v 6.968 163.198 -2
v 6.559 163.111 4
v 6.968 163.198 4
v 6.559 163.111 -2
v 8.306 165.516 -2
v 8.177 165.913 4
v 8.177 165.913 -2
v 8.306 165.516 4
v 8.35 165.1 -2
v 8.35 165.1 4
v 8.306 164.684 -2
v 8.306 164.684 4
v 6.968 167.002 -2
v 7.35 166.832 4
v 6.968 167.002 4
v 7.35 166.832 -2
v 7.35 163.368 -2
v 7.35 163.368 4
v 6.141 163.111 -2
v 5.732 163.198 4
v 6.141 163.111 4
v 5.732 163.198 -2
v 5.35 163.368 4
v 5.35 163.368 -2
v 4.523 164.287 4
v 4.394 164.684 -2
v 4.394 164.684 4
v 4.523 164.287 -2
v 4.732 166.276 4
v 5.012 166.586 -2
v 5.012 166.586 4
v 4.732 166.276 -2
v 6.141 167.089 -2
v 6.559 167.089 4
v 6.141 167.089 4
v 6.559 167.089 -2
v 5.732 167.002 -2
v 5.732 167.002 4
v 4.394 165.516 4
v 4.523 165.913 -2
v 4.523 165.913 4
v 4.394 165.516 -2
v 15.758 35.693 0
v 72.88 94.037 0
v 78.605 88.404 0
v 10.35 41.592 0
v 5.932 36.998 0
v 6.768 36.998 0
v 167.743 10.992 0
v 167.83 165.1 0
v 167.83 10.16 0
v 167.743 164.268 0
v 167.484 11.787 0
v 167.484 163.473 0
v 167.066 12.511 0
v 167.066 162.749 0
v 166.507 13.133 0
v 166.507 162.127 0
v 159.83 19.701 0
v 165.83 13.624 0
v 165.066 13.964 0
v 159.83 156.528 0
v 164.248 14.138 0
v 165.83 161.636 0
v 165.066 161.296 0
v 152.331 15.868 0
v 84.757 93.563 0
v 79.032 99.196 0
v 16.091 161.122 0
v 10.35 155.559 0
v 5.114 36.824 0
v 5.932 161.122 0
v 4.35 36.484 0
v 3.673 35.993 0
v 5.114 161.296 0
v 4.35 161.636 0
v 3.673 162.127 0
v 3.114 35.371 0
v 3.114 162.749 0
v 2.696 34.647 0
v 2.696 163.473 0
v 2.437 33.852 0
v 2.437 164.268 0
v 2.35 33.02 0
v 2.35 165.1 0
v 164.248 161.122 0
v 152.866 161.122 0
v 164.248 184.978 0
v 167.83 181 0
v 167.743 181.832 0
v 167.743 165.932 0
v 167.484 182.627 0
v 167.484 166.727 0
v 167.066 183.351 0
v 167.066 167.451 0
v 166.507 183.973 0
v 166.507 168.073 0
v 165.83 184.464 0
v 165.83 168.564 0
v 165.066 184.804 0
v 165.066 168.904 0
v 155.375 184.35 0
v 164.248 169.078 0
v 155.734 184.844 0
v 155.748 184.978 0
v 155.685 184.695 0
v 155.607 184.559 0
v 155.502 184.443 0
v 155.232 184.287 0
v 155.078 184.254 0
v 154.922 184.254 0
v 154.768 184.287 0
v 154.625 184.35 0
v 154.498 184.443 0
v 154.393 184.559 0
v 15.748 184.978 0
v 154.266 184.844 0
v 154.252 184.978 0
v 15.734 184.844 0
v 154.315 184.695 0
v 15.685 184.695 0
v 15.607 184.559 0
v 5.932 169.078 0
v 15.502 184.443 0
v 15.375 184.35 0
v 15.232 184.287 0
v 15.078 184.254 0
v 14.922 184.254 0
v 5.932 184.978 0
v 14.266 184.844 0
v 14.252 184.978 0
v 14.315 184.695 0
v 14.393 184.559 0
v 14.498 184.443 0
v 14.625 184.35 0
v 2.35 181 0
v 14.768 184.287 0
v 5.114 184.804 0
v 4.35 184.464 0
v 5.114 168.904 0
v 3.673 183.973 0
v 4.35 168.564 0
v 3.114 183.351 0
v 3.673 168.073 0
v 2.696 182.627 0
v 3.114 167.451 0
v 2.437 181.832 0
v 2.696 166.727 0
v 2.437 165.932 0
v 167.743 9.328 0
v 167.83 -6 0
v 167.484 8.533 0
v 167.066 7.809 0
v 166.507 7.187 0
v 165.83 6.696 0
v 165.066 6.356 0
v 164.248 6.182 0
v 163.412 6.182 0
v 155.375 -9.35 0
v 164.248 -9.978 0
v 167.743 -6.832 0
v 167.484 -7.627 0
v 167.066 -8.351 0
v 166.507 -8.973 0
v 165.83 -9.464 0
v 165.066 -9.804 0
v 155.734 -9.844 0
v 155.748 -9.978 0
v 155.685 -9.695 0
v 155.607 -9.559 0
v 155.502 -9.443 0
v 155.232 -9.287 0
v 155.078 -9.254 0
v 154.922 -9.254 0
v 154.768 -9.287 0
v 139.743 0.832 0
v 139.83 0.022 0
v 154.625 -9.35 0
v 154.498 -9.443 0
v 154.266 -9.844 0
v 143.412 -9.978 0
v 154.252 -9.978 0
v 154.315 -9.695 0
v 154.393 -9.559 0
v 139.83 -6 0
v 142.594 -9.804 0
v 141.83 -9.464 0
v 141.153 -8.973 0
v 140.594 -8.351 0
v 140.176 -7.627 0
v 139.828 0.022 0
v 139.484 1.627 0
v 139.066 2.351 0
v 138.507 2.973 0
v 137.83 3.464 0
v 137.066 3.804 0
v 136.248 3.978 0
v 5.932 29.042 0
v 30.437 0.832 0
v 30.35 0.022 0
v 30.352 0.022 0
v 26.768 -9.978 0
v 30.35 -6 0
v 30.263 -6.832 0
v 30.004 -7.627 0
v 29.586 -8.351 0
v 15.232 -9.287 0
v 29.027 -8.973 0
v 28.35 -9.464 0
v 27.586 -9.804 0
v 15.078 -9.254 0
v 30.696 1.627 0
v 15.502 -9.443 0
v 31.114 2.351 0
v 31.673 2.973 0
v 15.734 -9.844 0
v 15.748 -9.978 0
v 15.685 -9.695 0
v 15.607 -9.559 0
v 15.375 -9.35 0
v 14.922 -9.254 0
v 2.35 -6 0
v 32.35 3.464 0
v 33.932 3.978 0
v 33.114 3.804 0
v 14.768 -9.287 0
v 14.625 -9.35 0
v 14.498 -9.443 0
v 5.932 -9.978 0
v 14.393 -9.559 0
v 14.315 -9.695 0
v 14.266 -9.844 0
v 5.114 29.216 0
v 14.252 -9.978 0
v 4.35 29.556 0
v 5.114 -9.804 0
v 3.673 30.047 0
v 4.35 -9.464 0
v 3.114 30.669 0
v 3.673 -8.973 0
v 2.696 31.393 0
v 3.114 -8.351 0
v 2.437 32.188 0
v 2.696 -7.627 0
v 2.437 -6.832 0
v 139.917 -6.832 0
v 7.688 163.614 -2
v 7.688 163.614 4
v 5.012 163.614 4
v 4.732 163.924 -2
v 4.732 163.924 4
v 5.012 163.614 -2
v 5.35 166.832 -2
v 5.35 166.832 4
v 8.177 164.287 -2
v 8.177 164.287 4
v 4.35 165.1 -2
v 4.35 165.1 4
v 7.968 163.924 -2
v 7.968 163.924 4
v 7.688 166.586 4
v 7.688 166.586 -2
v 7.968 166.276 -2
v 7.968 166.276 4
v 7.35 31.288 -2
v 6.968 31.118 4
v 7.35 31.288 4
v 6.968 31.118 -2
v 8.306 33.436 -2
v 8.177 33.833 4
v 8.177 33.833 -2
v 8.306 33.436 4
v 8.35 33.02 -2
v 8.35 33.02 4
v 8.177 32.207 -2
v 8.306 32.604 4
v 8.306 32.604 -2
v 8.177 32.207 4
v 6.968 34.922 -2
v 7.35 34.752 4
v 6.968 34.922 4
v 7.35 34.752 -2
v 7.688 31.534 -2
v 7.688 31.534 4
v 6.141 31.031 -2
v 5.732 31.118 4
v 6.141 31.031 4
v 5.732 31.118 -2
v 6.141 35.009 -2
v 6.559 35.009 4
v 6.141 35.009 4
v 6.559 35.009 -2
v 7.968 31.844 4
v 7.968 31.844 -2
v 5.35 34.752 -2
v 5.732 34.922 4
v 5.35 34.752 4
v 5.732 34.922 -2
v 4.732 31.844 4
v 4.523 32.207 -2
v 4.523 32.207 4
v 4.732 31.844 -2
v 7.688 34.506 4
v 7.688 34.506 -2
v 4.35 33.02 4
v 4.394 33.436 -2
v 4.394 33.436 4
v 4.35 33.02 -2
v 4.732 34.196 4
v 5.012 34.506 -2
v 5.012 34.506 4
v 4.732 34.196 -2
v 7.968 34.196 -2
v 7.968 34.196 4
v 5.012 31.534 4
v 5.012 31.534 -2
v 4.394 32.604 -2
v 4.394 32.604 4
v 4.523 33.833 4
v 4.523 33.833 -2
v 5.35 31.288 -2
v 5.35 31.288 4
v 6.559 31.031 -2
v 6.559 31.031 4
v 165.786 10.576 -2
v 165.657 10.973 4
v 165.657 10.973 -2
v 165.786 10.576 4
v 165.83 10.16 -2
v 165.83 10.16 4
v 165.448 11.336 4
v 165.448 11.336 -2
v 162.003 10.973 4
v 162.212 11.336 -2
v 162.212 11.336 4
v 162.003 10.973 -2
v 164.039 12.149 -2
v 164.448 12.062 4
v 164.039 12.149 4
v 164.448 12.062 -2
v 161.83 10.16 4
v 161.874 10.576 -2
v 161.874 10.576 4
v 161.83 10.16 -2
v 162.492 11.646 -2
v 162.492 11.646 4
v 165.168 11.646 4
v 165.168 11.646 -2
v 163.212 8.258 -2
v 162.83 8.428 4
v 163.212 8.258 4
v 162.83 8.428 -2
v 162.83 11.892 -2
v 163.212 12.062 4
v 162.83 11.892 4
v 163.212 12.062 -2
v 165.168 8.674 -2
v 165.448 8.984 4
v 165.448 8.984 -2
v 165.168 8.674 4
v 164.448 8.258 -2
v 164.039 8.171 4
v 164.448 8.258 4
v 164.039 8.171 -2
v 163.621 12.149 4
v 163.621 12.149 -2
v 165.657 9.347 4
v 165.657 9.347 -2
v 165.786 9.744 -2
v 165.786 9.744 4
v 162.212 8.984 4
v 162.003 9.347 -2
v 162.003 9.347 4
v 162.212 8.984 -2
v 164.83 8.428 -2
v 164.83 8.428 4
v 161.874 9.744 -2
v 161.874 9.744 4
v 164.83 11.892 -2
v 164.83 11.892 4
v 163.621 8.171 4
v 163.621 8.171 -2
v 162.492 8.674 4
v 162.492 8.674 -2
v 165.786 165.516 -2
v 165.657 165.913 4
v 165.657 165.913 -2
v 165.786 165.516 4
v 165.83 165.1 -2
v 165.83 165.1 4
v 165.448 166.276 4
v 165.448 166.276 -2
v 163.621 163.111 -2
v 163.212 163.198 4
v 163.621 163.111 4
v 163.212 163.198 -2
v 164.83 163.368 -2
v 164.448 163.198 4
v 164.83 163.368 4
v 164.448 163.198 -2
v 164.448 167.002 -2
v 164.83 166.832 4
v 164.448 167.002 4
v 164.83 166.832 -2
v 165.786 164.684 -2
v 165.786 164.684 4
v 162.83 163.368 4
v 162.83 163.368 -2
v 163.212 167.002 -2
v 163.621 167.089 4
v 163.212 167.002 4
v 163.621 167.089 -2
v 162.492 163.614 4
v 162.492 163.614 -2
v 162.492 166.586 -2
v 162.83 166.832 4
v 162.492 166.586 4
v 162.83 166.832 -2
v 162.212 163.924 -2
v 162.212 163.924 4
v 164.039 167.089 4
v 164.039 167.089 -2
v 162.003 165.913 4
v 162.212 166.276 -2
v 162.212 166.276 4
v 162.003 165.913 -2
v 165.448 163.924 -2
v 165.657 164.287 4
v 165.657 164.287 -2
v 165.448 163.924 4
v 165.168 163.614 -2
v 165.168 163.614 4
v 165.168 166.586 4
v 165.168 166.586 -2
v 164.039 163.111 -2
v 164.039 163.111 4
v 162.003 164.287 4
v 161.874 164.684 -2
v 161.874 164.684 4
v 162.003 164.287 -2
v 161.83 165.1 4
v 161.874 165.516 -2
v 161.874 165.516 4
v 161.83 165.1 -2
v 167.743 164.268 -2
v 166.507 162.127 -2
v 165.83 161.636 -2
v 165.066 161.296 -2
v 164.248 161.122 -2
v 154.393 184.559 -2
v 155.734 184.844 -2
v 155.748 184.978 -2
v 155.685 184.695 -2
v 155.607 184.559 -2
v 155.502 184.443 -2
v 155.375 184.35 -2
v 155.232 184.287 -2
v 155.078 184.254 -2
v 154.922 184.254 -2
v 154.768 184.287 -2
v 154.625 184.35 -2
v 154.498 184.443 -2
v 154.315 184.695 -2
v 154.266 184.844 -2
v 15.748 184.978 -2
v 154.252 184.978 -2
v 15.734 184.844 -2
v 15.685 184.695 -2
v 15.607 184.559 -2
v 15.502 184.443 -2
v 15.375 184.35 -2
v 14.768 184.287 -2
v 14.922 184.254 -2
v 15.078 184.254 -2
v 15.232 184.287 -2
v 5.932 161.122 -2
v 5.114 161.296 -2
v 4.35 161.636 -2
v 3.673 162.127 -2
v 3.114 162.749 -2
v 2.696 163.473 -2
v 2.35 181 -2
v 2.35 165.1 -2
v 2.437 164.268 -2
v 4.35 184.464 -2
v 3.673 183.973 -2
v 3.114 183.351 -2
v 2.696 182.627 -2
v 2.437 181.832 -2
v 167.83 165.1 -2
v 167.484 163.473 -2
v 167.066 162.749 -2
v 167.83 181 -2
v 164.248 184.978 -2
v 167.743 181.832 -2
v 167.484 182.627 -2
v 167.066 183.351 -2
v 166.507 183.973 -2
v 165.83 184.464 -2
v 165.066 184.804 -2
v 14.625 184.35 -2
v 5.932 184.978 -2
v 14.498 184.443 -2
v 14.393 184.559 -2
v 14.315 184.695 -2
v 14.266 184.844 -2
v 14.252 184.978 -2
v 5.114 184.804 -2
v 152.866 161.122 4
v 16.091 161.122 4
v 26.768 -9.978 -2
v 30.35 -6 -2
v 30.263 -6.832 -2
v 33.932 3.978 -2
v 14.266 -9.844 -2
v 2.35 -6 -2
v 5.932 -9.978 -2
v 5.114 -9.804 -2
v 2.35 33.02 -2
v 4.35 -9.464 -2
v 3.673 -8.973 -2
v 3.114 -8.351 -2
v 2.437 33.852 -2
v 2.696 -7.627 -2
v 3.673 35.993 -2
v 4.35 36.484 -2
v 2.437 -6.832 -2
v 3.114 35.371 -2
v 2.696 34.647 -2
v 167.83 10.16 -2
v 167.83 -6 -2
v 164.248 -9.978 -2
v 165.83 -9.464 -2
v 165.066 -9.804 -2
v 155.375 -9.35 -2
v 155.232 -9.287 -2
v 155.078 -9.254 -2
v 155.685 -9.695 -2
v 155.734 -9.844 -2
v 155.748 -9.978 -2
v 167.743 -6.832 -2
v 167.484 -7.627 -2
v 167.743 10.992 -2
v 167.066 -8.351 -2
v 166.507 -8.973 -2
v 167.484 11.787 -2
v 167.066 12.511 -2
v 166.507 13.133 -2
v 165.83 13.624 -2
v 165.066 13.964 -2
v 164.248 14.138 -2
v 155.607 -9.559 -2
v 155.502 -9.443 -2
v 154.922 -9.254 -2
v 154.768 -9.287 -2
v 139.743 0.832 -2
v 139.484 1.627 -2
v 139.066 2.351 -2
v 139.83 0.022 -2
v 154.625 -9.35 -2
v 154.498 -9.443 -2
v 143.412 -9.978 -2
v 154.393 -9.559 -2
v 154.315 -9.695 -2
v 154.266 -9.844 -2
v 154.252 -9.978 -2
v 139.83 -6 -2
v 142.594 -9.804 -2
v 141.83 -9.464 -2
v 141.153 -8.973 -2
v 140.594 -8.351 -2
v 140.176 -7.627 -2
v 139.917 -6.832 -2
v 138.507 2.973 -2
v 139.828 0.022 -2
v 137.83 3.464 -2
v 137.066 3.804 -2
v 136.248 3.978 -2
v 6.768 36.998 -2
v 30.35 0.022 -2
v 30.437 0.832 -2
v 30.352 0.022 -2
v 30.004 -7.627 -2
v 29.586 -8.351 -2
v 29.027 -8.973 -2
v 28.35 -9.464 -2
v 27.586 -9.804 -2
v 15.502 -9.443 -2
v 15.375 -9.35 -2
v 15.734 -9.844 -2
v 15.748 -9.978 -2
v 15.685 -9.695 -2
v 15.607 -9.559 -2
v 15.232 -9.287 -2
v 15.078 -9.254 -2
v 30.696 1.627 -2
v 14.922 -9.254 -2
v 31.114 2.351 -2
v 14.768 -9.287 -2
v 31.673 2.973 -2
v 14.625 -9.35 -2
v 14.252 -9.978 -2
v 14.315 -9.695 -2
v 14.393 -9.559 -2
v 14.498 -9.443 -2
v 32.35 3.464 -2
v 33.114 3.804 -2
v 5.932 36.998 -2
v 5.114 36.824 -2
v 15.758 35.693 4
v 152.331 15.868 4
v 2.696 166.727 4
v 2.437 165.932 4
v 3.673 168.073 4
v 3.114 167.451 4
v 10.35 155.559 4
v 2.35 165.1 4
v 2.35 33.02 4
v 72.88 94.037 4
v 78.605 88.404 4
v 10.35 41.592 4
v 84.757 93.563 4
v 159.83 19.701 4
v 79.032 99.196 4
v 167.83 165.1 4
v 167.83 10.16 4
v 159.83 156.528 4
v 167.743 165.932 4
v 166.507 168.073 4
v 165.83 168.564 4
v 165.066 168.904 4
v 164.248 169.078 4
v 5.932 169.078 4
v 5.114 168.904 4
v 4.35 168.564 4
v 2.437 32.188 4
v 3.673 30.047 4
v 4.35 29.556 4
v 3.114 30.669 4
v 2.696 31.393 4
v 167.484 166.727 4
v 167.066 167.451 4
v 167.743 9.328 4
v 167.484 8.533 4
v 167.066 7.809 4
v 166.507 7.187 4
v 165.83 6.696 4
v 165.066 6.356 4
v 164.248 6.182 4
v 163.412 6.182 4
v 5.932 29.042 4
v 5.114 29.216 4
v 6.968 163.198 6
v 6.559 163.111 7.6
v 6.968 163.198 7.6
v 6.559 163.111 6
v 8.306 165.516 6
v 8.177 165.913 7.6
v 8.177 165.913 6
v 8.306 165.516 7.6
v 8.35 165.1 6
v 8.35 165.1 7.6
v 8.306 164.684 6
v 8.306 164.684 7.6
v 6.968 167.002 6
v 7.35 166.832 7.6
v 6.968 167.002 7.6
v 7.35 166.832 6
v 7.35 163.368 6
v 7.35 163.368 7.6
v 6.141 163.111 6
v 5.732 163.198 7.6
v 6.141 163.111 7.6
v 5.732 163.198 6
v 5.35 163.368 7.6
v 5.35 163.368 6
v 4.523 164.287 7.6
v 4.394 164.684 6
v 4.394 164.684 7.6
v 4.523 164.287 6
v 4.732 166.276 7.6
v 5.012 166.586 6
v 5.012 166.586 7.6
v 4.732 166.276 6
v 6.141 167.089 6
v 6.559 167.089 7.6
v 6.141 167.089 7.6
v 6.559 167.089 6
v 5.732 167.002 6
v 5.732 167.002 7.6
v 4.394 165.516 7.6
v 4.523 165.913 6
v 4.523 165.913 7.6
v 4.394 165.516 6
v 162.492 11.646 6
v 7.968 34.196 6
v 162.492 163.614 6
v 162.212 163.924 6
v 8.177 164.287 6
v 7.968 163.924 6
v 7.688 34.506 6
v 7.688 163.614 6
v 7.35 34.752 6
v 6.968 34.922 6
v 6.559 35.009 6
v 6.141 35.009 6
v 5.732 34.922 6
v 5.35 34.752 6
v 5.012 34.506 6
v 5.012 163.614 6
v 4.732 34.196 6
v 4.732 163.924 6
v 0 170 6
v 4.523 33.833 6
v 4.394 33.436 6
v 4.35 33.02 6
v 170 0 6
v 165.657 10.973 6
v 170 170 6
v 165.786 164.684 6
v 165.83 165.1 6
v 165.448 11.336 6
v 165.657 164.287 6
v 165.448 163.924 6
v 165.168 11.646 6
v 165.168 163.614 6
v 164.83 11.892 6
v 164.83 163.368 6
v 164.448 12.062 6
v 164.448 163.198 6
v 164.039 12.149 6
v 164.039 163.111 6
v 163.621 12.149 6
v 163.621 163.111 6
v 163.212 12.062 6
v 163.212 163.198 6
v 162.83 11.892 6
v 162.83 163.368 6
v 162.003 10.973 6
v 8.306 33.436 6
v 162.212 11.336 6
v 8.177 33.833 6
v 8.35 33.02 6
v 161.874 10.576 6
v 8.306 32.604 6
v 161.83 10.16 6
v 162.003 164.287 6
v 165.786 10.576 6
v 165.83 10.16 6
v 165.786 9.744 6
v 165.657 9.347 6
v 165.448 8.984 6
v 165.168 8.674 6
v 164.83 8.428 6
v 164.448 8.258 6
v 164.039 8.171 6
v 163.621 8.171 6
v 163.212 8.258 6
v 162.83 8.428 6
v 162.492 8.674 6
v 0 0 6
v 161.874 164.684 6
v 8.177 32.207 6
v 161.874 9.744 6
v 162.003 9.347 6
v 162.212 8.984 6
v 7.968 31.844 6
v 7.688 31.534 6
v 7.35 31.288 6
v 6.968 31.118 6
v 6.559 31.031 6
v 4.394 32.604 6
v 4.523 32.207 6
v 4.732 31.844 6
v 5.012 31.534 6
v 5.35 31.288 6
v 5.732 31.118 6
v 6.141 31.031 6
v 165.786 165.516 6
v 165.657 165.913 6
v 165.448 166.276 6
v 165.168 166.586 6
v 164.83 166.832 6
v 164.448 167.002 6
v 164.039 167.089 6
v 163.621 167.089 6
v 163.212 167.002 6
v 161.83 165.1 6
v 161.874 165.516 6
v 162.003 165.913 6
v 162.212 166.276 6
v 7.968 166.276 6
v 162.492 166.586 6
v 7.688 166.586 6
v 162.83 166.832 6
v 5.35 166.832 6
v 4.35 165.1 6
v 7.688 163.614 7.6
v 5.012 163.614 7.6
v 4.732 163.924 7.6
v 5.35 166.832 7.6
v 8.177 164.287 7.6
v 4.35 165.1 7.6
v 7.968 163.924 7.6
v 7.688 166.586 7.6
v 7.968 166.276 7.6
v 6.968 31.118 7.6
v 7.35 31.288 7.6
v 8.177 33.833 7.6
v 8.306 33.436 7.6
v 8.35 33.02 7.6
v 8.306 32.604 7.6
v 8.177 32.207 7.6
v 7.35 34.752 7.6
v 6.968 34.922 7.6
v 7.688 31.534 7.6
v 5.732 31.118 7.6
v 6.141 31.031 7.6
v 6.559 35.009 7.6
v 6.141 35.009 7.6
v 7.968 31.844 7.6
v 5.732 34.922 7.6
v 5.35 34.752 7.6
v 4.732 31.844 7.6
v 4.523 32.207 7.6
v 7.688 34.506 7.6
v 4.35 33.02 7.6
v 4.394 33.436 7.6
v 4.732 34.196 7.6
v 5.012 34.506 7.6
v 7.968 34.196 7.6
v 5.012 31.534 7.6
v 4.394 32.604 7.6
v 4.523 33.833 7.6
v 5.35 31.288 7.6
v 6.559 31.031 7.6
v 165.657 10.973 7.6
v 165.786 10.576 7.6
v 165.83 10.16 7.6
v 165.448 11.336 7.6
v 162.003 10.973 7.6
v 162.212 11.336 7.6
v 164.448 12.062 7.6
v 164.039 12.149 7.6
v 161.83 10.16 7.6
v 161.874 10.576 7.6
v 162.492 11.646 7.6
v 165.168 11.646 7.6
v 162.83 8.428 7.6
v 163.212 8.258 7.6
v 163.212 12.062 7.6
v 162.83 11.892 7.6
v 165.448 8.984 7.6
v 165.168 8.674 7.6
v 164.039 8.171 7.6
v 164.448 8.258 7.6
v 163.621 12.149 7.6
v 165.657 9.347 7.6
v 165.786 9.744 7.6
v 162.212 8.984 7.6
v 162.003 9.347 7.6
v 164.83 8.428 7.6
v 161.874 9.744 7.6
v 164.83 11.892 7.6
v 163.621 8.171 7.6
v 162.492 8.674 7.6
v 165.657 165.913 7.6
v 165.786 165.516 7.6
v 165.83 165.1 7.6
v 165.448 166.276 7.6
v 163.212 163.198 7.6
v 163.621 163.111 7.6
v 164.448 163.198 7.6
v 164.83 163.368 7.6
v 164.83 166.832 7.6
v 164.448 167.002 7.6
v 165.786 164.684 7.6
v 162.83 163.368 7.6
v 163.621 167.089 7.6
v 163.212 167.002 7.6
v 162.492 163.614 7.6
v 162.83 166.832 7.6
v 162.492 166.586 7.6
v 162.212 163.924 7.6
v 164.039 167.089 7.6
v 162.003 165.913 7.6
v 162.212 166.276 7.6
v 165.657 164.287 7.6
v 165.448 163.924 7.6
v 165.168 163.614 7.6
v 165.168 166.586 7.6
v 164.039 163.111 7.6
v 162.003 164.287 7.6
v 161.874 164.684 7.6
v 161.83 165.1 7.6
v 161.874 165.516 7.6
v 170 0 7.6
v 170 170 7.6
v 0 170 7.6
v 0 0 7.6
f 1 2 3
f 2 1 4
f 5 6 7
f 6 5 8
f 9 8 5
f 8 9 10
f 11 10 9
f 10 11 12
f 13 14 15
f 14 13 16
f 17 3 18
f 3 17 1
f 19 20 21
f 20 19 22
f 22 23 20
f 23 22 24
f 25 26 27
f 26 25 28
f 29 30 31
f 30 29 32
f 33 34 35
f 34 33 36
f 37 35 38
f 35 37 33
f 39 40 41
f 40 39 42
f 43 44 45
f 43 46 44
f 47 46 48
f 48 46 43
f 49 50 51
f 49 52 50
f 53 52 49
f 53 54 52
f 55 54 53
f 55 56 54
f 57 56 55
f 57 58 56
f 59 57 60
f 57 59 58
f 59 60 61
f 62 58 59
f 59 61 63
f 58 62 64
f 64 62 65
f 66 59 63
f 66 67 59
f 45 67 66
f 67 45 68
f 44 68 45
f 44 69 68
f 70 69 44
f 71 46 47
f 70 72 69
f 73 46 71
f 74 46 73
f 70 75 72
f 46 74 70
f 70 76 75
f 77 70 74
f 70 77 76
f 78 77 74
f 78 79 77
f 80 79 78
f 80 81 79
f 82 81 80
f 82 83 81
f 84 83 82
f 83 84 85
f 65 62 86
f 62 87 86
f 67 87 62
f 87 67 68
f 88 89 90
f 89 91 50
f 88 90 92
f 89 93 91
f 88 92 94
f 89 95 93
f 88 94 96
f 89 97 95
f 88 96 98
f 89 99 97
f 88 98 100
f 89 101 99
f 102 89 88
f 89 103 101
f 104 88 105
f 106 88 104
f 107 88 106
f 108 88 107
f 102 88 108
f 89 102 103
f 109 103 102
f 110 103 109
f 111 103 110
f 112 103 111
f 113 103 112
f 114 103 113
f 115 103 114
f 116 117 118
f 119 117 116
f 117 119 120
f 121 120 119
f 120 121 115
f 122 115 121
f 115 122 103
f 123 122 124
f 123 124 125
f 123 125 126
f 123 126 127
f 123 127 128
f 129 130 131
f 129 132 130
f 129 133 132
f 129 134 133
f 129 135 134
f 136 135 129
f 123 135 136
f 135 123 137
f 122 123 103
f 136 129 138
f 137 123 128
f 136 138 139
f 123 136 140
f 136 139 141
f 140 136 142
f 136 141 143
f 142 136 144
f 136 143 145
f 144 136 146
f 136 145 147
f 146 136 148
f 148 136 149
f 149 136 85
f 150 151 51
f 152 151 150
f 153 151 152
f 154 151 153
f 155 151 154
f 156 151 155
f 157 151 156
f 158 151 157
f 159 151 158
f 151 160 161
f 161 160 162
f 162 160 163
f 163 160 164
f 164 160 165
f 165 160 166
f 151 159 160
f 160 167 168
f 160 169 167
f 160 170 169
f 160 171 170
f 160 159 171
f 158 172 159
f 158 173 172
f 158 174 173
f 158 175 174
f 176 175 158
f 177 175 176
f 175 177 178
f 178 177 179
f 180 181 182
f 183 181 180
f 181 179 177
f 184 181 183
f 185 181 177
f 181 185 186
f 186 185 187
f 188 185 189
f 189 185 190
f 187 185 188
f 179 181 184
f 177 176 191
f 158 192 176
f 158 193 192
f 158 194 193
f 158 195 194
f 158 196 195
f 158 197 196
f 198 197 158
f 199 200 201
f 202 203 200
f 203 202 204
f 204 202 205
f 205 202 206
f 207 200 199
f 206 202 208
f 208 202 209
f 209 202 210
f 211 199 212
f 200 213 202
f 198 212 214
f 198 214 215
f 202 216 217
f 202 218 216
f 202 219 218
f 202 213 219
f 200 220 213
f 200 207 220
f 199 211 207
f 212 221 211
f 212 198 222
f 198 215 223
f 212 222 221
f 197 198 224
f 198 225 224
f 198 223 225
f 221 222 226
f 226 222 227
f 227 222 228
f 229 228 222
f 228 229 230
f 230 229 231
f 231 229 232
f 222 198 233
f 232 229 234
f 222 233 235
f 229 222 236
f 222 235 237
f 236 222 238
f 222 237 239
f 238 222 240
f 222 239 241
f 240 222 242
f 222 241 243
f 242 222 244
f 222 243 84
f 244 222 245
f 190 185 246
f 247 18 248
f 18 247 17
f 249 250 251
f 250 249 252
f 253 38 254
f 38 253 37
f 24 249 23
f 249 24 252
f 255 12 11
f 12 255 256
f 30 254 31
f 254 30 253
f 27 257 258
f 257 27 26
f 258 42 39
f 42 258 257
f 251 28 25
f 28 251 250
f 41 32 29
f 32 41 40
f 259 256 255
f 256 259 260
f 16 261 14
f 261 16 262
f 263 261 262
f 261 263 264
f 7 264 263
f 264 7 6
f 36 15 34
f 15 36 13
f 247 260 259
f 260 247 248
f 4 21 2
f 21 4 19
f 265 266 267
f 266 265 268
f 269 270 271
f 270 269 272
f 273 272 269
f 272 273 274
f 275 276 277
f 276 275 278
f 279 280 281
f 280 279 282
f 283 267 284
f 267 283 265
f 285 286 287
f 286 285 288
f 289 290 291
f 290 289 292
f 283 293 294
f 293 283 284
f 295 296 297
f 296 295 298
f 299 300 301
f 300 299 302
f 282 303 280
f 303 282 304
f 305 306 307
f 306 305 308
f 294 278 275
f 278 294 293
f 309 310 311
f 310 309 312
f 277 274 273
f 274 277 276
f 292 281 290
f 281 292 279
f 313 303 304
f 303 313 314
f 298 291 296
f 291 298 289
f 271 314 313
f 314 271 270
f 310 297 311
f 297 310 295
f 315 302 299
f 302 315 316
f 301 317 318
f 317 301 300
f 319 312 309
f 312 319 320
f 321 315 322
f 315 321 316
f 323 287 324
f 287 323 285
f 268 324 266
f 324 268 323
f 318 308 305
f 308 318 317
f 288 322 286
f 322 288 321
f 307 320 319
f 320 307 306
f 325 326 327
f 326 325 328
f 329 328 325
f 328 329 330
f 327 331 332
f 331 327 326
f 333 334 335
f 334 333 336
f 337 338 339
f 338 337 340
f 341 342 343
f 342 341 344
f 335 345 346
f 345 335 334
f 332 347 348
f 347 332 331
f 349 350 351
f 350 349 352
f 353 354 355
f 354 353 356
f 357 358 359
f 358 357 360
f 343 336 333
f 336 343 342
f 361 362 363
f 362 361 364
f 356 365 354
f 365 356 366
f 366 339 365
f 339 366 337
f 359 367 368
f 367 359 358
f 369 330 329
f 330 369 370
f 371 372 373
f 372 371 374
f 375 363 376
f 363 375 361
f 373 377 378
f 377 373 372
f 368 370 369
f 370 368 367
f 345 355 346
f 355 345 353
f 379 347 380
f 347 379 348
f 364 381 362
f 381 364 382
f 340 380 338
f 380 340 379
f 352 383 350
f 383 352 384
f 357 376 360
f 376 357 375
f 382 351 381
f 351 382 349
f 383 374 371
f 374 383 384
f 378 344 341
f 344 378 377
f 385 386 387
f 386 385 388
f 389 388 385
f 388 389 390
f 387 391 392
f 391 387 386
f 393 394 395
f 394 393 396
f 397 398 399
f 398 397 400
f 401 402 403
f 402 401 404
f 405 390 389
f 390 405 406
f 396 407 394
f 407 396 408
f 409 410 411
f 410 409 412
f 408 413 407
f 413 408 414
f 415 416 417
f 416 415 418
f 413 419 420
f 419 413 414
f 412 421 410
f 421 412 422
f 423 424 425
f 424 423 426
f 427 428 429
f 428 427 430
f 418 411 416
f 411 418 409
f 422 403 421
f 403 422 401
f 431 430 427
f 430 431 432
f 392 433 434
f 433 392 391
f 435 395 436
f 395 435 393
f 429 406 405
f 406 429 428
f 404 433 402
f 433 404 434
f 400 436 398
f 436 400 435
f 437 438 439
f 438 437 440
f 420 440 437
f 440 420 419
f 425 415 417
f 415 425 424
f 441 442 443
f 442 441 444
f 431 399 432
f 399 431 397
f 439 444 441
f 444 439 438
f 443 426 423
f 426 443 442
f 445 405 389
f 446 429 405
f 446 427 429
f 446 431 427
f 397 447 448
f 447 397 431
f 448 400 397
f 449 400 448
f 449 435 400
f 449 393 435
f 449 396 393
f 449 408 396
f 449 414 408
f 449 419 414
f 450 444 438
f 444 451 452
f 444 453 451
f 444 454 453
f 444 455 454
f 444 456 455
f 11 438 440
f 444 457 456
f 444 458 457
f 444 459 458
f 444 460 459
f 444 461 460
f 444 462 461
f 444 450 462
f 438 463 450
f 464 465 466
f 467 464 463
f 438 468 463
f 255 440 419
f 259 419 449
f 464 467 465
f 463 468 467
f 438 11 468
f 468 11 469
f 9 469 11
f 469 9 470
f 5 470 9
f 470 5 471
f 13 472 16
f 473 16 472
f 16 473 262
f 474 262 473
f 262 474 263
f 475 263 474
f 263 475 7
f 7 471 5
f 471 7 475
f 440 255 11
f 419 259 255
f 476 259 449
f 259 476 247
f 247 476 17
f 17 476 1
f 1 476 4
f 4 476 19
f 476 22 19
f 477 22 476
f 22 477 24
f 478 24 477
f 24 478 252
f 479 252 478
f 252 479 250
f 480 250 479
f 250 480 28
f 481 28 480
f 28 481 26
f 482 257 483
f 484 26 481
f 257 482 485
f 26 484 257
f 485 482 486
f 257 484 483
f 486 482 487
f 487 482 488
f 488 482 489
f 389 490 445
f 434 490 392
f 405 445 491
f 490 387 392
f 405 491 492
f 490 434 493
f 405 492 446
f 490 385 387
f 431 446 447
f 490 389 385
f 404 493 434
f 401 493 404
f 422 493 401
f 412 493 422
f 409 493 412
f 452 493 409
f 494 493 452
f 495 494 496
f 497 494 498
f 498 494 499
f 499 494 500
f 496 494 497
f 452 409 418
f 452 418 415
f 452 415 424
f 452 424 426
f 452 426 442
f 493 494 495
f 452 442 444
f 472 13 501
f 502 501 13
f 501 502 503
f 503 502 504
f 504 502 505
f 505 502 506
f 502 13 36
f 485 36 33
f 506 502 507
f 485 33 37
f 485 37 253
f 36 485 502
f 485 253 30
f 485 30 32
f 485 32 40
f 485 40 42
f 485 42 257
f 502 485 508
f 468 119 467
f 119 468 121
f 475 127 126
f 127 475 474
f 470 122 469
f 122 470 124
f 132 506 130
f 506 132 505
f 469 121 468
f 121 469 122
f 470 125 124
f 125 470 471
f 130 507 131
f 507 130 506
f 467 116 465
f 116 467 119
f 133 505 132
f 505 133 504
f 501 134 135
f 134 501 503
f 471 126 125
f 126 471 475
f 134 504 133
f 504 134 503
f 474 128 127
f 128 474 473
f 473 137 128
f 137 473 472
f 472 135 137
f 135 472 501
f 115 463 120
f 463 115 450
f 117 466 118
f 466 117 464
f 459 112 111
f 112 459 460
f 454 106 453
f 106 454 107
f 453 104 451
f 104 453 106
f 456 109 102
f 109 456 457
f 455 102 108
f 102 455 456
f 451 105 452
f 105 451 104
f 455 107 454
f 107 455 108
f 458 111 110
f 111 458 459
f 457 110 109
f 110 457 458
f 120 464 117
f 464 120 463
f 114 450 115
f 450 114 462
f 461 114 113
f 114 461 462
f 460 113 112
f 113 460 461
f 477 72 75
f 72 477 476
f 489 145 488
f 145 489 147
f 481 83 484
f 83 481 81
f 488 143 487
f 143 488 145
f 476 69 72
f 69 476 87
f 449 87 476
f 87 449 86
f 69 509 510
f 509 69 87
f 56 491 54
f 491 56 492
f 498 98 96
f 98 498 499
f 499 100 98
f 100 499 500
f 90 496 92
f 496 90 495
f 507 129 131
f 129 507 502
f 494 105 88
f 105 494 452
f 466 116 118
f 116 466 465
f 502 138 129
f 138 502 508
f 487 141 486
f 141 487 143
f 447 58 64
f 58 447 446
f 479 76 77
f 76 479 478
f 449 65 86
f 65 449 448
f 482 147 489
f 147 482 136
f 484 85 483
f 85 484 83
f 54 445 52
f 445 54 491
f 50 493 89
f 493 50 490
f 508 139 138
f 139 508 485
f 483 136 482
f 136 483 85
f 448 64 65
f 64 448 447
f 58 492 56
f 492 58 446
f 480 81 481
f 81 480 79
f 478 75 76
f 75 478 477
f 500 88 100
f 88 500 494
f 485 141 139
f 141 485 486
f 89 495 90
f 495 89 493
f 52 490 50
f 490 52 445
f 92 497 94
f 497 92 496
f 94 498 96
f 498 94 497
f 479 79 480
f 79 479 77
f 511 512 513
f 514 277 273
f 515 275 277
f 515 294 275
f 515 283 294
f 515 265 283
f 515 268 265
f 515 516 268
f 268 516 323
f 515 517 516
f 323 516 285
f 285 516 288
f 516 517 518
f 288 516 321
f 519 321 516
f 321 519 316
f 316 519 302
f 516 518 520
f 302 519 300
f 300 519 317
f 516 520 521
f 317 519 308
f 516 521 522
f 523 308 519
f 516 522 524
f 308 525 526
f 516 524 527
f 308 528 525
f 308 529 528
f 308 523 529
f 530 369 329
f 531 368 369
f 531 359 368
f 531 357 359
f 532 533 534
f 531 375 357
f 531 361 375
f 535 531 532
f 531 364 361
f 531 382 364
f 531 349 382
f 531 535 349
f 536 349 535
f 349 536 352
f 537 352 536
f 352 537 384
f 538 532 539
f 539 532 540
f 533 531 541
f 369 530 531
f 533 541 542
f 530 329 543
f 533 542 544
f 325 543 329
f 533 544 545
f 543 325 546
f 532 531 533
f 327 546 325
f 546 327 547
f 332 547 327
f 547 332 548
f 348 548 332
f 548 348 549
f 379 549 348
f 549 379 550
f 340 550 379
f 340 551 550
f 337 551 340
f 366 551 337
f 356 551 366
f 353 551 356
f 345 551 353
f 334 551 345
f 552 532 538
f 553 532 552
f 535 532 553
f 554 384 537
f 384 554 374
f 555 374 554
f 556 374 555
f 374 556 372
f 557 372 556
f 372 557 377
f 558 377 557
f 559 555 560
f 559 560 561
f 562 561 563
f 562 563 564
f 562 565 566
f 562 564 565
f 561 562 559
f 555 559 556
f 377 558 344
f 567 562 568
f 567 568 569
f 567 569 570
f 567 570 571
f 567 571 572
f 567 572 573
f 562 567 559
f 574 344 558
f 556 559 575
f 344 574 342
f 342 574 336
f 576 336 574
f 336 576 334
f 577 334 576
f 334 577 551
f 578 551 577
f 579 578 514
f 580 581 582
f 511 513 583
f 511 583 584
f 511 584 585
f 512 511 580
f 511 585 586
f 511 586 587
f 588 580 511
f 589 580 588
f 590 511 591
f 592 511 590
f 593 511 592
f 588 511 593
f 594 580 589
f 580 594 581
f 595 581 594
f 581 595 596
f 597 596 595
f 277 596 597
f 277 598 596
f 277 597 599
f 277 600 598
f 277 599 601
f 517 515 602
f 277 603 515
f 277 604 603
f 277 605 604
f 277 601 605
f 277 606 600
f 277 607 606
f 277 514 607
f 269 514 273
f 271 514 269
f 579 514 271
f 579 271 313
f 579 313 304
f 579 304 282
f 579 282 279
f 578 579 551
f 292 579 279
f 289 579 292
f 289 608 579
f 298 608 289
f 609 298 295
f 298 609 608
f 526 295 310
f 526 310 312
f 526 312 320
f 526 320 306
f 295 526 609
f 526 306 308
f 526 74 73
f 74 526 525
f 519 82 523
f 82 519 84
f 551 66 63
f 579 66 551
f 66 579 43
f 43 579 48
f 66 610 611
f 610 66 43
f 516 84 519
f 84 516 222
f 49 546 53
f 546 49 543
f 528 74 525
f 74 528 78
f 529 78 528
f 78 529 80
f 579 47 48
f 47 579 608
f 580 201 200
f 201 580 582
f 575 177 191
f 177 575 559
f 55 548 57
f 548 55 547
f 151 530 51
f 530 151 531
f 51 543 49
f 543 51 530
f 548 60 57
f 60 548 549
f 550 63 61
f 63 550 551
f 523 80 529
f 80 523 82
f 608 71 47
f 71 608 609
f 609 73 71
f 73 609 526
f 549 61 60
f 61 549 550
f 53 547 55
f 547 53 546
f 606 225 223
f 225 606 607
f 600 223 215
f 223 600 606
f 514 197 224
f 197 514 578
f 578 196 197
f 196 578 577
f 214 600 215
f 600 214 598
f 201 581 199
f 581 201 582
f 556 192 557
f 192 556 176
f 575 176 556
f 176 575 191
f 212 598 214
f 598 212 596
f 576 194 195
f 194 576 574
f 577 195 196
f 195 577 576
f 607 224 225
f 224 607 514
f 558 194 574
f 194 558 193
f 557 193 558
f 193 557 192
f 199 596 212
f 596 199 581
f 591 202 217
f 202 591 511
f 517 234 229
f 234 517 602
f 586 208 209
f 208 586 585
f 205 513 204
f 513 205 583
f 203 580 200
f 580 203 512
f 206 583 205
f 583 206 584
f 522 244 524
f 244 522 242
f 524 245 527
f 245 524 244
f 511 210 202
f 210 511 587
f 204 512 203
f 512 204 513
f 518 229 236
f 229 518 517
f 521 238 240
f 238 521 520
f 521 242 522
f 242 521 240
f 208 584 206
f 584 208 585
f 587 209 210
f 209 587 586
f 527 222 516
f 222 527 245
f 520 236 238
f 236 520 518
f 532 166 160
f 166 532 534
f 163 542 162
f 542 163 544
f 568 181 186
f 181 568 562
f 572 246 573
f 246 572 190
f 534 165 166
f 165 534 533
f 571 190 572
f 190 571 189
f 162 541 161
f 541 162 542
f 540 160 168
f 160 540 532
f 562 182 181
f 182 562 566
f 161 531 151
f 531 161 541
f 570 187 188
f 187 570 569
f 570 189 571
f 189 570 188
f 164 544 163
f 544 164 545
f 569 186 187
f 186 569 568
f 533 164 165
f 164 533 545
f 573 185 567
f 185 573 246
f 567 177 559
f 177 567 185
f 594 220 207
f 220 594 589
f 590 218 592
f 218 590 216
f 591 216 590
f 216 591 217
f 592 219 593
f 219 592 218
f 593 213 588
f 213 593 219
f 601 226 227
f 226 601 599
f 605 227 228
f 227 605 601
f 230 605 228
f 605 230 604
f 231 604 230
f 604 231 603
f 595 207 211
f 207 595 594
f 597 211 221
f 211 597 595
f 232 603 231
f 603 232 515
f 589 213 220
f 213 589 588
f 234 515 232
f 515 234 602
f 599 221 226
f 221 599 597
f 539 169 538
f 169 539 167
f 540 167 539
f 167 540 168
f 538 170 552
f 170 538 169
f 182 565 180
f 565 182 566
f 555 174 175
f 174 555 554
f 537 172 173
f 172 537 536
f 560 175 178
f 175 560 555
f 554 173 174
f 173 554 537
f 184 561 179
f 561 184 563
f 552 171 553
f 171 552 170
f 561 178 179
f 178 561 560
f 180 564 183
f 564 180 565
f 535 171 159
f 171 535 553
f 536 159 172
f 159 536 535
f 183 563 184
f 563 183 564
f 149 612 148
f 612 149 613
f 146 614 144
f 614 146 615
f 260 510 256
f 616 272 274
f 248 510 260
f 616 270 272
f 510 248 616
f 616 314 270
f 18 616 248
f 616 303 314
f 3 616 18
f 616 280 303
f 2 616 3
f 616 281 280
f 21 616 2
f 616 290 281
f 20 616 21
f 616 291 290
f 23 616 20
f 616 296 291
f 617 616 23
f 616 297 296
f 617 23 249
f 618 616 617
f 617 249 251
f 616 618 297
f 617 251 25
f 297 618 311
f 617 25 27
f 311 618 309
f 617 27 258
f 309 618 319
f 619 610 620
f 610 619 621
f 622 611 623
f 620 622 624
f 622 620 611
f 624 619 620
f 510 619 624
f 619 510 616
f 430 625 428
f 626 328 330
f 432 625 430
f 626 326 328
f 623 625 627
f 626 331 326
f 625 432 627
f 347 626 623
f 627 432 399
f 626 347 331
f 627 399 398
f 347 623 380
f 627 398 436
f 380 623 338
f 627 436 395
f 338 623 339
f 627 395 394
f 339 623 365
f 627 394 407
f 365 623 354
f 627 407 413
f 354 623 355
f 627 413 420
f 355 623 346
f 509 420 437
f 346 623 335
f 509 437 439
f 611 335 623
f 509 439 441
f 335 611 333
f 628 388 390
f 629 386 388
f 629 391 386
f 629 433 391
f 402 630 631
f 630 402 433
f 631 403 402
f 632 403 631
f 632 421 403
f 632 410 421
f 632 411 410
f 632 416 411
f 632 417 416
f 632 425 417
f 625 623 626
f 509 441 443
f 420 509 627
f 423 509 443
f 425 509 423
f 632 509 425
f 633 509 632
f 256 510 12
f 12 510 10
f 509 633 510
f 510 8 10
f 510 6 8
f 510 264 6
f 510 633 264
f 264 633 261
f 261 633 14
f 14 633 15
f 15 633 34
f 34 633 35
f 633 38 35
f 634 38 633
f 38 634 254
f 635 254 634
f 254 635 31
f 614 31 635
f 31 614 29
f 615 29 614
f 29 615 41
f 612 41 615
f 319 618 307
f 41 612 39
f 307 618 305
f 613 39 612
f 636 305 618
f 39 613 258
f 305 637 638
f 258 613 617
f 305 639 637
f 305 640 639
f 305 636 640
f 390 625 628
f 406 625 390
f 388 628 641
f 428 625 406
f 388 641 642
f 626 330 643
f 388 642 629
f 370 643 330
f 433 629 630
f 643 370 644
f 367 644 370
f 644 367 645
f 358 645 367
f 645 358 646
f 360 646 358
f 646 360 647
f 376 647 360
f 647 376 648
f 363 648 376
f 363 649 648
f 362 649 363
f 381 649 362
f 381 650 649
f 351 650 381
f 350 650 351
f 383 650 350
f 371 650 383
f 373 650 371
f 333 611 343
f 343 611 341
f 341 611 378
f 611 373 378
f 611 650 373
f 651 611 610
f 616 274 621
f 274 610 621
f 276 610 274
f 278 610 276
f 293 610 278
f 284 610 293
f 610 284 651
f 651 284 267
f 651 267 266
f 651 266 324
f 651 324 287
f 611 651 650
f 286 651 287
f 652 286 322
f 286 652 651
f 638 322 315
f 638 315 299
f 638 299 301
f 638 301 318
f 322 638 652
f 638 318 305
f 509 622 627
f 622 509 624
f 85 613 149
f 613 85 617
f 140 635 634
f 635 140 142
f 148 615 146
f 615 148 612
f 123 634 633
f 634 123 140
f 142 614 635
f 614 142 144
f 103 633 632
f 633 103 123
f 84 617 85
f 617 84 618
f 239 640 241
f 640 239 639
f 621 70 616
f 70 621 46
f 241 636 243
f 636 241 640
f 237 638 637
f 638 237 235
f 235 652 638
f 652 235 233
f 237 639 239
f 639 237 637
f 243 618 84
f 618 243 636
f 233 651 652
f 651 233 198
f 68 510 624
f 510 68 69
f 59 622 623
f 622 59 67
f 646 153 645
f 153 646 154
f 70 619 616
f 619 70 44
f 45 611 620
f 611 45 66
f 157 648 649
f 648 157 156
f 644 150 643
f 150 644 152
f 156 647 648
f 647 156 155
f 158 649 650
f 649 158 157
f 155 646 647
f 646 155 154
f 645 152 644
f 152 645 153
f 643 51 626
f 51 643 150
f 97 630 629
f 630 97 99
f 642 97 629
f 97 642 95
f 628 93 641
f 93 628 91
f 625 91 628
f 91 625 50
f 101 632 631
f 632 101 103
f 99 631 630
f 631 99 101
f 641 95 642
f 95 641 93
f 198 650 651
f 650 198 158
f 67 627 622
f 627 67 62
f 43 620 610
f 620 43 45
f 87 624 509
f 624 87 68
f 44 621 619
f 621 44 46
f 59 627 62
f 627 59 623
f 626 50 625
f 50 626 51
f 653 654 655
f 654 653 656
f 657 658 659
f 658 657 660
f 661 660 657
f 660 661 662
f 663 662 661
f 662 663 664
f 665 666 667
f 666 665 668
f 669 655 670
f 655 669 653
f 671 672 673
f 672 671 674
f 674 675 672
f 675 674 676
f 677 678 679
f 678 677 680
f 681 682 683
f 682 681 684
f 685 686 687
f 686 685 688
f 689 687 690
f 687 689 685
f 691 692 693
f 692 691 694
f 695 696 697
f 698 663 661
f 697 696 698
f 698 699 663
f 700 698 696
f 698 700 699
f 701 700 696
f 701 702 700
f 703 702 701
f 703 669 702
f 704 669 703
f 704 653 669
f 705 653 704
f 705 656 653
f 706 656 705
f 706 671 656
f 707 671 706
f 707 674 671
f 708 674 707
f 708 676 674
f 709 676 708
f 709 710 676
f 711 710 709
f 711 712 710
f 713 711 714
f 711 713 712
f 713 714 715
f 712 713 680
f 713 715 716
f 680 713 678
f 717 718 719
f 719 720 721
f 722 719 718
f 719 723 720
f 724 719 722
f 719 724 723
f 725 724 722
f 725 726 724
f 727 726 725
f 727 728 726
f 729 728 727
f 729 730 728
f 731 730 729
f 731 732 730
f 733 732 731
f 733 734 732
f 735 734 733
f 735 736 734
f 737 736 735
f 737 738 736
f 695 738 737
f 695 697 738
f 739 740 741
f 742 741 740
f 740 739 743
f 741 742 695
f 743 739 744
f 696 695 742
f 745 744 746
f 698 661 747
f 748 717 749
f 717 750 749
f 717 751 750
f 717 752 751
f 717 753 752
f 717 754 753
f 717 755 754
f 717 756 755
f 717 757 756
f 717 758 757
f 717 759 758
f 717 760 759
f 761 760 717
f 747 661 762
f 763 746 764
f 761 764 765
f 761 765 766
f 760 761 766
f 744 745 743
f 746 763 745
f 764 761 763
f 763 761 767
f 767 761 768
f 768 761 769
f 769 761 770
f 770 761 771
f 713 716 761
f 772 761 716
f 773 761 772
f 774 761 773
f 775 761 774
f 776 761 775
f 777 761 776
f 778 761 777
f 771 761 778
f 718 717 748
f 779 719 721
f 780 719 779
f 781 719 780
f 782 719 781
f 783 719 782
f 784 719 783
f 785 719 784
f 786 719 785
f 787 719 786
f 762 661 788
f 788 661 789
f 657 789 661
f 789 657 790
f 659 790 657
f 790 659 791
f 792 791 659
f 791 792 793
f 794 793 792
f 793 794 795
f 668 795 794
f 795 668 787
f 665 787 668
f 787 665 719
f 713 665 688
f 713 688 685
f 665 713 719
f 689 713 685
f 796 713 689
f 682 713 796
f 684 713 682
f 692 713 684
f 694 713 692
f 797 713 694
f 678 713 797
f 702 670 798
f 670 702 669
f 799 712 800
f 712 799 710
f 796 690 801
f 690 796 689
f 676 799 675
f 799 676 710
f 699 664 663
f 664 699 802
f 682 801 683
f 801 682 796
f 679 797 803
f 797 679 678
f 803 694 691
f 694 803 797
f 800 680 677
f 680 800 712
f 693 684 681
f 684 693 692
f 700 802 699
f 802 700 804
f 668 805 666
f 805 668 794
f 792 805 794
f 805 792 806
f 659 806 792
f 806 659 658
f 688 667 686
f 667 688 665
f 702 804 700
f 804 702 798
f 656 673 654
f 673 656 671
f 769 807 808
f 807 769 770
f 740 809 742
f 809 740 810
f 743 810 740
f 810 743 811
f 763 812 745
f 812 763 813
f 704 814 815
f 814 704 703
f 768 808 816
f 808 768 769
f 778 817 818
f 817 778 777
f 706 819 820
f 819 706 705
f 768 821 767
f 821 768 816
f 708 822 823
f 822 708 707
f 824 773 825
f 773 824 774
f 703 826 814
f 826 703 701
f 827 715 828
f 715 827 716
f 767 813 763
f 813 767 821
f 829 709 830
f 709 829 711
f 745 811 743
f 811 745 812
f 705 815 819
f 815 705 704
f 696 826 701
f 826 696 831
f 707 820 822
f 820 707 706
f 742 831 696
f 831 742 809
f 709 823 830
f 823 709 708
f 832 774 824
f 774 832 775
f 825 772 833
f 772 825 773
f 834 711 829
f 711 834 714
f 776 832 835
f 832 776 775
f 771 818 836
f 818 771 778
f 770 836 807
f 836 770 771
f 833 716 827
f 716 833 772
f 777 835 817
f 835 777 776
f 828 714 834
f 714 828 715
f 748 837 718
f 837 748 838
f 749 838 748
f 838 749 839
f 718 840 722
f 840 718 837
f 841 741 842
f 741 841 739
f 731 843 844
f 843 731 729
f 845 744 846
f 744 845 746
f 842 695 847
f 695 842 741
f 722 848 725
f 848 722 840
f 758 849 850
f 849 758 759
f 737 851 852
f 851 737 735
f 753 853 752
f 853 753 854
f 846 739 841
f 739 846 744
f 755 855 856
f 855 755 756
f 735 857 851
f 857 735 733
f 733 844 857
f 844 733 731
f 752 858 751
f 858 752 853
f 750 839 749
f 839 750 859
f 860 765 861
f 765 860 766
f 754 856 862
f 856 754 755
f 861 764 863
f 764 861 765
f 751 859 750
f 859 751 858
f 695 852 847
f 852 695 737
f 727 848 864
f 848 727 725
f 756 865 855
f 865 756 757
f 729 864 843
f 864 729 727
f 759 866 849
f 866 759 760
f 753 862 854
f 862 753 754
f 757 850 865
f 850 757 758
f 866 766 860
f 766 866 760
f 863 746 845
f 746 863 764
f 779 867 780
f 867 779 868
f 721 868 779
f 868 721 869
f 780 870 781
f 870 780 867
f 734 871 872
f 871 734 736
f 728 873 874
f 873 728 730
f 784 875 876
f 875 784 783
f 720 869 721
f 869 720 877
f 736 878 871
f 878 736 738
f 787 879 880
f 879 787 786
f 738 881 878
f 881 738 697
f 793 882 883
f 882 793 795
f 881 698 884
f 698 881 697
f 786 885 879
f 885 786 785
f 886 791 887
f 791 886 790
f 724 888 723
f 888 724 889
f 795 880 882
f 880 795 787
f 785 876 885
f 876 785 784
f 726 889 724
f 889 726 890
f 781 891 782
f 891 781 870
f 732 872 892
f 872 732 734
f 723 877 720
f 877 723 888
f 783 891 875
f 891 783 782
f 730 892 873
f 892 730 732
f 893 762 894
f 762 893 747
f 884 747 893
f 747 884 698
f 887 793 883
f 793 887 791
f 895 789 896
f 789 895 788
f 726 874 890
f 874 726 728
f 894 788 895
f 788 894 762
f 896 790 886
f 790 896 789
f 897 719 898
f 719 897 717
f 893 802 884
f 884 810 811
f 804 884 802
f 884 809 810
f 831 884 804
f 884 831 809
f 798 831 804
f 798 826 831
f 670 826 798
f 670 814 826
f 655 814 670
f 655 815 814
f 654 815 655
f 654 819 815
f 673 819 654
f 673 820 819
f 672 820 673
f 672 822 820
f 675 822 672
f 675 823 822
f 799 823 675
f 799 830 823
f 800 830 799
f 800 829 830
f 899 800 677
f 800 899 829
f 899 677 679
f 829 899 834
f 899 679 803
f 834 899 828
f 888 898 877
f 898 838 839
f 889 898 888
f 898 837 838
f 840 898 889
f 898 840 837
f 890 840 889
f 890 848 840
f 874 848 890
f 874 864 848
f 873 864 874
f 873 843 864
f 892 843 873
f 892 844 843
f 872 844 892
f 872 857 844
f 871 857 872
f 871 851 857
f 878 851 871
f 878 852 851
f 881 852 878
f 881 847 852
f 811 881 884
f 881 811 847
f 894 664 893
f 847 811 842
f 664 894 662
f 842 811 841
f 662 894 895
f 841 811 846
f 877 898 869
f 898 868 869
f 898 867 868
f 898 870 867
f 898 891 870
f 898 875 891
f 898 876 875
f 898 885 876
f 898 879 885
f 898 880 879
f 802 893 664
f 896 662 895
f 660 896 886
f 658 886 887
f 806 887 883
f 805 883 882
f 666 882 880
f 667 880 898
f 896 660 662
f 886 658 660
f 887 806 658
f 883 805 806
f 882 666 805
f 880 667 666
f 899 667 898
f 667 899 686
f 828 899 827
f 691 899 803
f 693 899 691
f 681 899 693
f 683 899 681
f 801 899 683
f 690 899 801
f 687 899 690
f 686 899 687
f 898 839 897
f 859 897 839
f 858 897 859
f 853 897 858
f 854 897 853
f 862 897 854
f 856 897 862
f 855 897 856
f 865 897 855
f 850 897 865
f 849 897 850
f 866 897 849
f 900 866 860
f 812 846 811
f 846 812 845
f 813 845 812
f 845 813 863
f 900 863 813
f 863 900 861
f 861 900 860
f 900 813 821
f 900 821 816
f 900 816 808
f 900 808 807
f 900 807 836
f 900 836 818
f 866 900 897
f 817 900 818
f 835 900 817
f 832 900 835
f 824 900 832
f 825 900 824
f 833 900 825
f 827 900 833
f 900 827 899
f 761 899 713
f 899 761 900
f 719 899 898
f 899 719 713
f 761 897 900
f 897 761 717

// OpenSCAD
BOARD_WIDTH = 170;
BOARD_LENGTH = 170;
BOARD_THICKNESS = 1.6;

MOUNT_HOLE_DIA = 4;
MOUNT_HOLE_SPACING = [
  [6.35, 165.1],
  [6.35, 33.02],
  [163.83, 10.16],
  [163.83, 165.1]
];

SUPPORT_THICKNESS = 4;
SUPPORT_CORNER_DIA = 2 * MOUNT_HOLE_DIA;

RAIL_THICKNESS = 2;
RAIL_CORNER_DIA = SUPPORT_CORNER_DIA;
FRONT_RAIL_EXTENSION = 10;
FRONT_RAIL_TAB_WIDTH = 28;
BACK_RAIL_EXTENSION = 15;

INDEX = true;
INDEX_DIA = 1.5;
INDEX_SPACING = 140;

$fn = 30;

module mounting_holes() {
  #for(i = [0:len(MOUNT_HOLE_SPACING)-1]) {
    translate([MOUNT_HOLE_SPACING[i][0], MOUNT_HOLE_SPACING[i][1], 0])
    cylinder(d = MOUNT_HOLE_DIA, h = 10);
  }
}

module board() {
  difference() {
    cube(size = [BOARD_WIDTH, BOARD_LENGTH, BOARD_THICKNESS]);
    mounting_holes();
  }
}

module pairwise_hull() {
  for(i = [0:$children-1]) {
    for(j = [0:$children-1]) {
      hull() {
        children(i);
        children(j);
      }
    }
  }
}

module board_support() {
  difference() {
    pairwise_hull() {
      // Needs lazy union on module().
      /*for(i = [0:len(MOUNT_HOLE_SPACING)-1]) {
        translate([MOUNT_HOLE_SPACING[i][0], MOUNT_HOLE_SPACING[i][1], 0])
        cylinder(d = MOUNT_HOLE_DIA * 2, h = BOARD_THICKNESS);
      }*/

      translate([MOUNT_HOLE_SPACING[0][0], MOUNT_HOLE_SPACING[0][1], 0])
      cylinder(d = SUPPORT_CORNER_DIA, h = SUPPORT_THICKNESS);
      
      translate([MOUNT_HOLE_SPACING[1][0], MOUNT_HOLE_SPACING[1][1], 0])
      cylinder(d = SUPPORT_CORNER_DIA, h = SUPPORT_THICKNESS);
      
      translate([MOUNT_HOLE_SPACING[2][0], MOUNT_HOLE_SPACING[2][1], 0])
      cylinder(d = SUPPORT_CORNER_DIA, h = SUPPORT_THICKNESS);
      
      translate([MOUNT_HOLE_SPACING[3][0], MOUNT_HOLE_SPACING[3][1], 0])
      cylinder(d = SUPPORT_CORNER_DIA, h = SUPPORT_THICKNESS);
    }
    mounting_holes();
  }
}

module index() {
  for(i = [-1, 1]) {
    translate([i * INDEX_SPACING/2, 0, 0])
    cylinder(d = INDEX_DIA, h = 10);
  }
}

module front_rail() {
  difference() {
    union() {
      difference() {
        hull() {
          translate([MOUNT_HOLE_SPACING[1][0], MOUNT_HOLE_SPACING[1][1], 0])
          cylinder(d = RAIL_CORNER_DIA, h = RAIL_THICKNESS);
            
          translate([MOUNT_HOLE_SPACING[2][0], MOUNT_HOLE_SPACING[2][1], 0])
          cylinder(d = RAIL_CORNER_DIA, h = RAIL_THICKNESS);

          translate([MOUNT_HOLE_SPACING[1][0], RAIL_CORNER_DIA/2, 0])
          cylinder(d = RAIL_CORNER_DIA, h = RAIL_THICKNESS);
            
          translate([MOUNT_HOLE_SPACING[2][0], RAIL_CORNER_DIA/2, 0])
          cylinder(d = RAIL_CORNER_DIA, h = RAIL_THICKNESS);
        }
        hull() {
          translate([MOUNT_HOLE_SPACING[1][0] + FRONT_RAIL_TAB_WIDTH, 0, 0])
          cylinder(d = RAIL_CORNER_DIA, h = RAIL_THICKNESS);

          translate([MOUNT_HOLE_SPACING[2][0] - FRONT_RAIL_TAB_WIDTH, 0, 0])
          cylinder(d = RAIL_CORNER_DIA, h = RAIL_THICKNESS);

        }
      }
      
      hull() {
        translate([MOUNT_HOLE_SPACING[1][0], RAIL_CORNER_DIA, 0])
        cylinder(d = RAIL_CORNER_DIA, h = RAIL_THICKNESS);
          
        translate([MOUNT_HOLE_SPACING[1][0] + FRONT_RAIL_TAB_WIDTH - RAIL_CORNER_DIA, RAIL_CORNER_DIA, 0])
        cylinder(d = RAIL_CORNER_DIA, h = RAIL_THICKNESS);

        translate([MOUNT_HOLE_SPACING[1][0], -FRONT_RAIL_EXTENSION + RAIL_CORNER_DIA/2, 0])
        cylinder(d = RAIL_CORNER_DIA, h = RAIL_THICKNESS);
          
        translate([MOUNT_HOLE_SPACING[1][0] + FRONT_RAIL_TAB_WIDTH - RAIL_CORNER_DIA, -FRONT_RAIL_EXTENSION + RAIL_CORNER_DIA/2, 0])
        cylinder(d = RAIL_CORNER_DIA, h = RAIL_THICKNESS);
      }

      hull() {
        translate([MOUNT_HOLE_SPACING[2][0], RAIL_CORNER_DIA, 0])
        cylinder(d = RAIL_CORNER_DIA, h = RAIL_THICKNESS);
          
        translate([MOUNT_HOLE_SPACING[2][0] - FRONT_RAIL_TAB_WIDTH + RAIL_CORNER_DIA, RAIL_CORNER_DIA, 0])
        cylinder(d = RAIL_CORNER_DIA, h = RAIL_THICKNESS);

        translate([MOUNT_HOLE_SPACING[2][0], -FRONT_RAIL_EXTENSION + RAIL_CORNER_DIA/2, 0])
        cylinder(d = RAIL_CORNER_DIA, h = RAIL_THICKNESS);
          
        translate([MOUNT_HOLE_SPACING[2][0] - FRONT_RAIL_TAB_WIDTH + RAIL_CORNER_DIA, -FRONT_RAIL_EXTENSION + RAIL_CORNER_DIA/2, 0])
        cylinder(d = RAIL_CORNER_DIA, h = RAIL_THICKNESS);
      }
    }

    mounting_holes();
    
    if(INDEX) {
      translate([BOARD_WIDTH/2, - FRONT_RAIL_EXTENSION, 0])
      index();
    }
  }
}

module back_rail() {
  difference() {
    hull() {
      translate([MOUNT_HOLE_SPACING[0][0], MOUNT_HOLE_SPACING[0][1], 0])
      cylinder(d = RAIL_CORNER_DIA, h = RAIL_THICKNESS);
        
      translate([MOUNT_HOLE_SPACING[3][0], MOUNT_HOLE_SPACING[3][1], 0])
      cylinder(d = RAIL_CORNER_DIA, h = RAIL_THICKNESS);

      translate([MOUNT_HOLE_SPACING[0][0], BOARD_LENGTH + BACK_RAIL_EXTENSION - RAIL_CORNER_DIA/2, 0])
      cylinder(d = RAIL_CORNER_DIA, h = RAIL_THICKNESS);
        
      translate([MOUNT_HOLE_SPACING[3][0], BOARD_LENGTH + BACK_RAIL_EXTENSION - RAIL_CORNER_DIA/2, 0])
      cylinder(d = RAIL_CORNER_DIA, h = RAIL_THICKNESS);
    }

    mounting_holes();
    
    if(INDEX) {
      translate([BOARD_WIDTH/2, BOARD_LENGTH + BACK_RAIL_EXTENSION, 0])
      index();
    }
  }
}

!union() {
  translate([0, 0, -RAIL_THICKNESS])
  back_rail();

  translate([0, 0, -RAIL_THICKNESS])
  front_rail();

  board_support();
  
  translate([0, 0, SUPPORT_THICKNESS + 2])
  board();
}

board_support();
front_rail();
back_rail();
